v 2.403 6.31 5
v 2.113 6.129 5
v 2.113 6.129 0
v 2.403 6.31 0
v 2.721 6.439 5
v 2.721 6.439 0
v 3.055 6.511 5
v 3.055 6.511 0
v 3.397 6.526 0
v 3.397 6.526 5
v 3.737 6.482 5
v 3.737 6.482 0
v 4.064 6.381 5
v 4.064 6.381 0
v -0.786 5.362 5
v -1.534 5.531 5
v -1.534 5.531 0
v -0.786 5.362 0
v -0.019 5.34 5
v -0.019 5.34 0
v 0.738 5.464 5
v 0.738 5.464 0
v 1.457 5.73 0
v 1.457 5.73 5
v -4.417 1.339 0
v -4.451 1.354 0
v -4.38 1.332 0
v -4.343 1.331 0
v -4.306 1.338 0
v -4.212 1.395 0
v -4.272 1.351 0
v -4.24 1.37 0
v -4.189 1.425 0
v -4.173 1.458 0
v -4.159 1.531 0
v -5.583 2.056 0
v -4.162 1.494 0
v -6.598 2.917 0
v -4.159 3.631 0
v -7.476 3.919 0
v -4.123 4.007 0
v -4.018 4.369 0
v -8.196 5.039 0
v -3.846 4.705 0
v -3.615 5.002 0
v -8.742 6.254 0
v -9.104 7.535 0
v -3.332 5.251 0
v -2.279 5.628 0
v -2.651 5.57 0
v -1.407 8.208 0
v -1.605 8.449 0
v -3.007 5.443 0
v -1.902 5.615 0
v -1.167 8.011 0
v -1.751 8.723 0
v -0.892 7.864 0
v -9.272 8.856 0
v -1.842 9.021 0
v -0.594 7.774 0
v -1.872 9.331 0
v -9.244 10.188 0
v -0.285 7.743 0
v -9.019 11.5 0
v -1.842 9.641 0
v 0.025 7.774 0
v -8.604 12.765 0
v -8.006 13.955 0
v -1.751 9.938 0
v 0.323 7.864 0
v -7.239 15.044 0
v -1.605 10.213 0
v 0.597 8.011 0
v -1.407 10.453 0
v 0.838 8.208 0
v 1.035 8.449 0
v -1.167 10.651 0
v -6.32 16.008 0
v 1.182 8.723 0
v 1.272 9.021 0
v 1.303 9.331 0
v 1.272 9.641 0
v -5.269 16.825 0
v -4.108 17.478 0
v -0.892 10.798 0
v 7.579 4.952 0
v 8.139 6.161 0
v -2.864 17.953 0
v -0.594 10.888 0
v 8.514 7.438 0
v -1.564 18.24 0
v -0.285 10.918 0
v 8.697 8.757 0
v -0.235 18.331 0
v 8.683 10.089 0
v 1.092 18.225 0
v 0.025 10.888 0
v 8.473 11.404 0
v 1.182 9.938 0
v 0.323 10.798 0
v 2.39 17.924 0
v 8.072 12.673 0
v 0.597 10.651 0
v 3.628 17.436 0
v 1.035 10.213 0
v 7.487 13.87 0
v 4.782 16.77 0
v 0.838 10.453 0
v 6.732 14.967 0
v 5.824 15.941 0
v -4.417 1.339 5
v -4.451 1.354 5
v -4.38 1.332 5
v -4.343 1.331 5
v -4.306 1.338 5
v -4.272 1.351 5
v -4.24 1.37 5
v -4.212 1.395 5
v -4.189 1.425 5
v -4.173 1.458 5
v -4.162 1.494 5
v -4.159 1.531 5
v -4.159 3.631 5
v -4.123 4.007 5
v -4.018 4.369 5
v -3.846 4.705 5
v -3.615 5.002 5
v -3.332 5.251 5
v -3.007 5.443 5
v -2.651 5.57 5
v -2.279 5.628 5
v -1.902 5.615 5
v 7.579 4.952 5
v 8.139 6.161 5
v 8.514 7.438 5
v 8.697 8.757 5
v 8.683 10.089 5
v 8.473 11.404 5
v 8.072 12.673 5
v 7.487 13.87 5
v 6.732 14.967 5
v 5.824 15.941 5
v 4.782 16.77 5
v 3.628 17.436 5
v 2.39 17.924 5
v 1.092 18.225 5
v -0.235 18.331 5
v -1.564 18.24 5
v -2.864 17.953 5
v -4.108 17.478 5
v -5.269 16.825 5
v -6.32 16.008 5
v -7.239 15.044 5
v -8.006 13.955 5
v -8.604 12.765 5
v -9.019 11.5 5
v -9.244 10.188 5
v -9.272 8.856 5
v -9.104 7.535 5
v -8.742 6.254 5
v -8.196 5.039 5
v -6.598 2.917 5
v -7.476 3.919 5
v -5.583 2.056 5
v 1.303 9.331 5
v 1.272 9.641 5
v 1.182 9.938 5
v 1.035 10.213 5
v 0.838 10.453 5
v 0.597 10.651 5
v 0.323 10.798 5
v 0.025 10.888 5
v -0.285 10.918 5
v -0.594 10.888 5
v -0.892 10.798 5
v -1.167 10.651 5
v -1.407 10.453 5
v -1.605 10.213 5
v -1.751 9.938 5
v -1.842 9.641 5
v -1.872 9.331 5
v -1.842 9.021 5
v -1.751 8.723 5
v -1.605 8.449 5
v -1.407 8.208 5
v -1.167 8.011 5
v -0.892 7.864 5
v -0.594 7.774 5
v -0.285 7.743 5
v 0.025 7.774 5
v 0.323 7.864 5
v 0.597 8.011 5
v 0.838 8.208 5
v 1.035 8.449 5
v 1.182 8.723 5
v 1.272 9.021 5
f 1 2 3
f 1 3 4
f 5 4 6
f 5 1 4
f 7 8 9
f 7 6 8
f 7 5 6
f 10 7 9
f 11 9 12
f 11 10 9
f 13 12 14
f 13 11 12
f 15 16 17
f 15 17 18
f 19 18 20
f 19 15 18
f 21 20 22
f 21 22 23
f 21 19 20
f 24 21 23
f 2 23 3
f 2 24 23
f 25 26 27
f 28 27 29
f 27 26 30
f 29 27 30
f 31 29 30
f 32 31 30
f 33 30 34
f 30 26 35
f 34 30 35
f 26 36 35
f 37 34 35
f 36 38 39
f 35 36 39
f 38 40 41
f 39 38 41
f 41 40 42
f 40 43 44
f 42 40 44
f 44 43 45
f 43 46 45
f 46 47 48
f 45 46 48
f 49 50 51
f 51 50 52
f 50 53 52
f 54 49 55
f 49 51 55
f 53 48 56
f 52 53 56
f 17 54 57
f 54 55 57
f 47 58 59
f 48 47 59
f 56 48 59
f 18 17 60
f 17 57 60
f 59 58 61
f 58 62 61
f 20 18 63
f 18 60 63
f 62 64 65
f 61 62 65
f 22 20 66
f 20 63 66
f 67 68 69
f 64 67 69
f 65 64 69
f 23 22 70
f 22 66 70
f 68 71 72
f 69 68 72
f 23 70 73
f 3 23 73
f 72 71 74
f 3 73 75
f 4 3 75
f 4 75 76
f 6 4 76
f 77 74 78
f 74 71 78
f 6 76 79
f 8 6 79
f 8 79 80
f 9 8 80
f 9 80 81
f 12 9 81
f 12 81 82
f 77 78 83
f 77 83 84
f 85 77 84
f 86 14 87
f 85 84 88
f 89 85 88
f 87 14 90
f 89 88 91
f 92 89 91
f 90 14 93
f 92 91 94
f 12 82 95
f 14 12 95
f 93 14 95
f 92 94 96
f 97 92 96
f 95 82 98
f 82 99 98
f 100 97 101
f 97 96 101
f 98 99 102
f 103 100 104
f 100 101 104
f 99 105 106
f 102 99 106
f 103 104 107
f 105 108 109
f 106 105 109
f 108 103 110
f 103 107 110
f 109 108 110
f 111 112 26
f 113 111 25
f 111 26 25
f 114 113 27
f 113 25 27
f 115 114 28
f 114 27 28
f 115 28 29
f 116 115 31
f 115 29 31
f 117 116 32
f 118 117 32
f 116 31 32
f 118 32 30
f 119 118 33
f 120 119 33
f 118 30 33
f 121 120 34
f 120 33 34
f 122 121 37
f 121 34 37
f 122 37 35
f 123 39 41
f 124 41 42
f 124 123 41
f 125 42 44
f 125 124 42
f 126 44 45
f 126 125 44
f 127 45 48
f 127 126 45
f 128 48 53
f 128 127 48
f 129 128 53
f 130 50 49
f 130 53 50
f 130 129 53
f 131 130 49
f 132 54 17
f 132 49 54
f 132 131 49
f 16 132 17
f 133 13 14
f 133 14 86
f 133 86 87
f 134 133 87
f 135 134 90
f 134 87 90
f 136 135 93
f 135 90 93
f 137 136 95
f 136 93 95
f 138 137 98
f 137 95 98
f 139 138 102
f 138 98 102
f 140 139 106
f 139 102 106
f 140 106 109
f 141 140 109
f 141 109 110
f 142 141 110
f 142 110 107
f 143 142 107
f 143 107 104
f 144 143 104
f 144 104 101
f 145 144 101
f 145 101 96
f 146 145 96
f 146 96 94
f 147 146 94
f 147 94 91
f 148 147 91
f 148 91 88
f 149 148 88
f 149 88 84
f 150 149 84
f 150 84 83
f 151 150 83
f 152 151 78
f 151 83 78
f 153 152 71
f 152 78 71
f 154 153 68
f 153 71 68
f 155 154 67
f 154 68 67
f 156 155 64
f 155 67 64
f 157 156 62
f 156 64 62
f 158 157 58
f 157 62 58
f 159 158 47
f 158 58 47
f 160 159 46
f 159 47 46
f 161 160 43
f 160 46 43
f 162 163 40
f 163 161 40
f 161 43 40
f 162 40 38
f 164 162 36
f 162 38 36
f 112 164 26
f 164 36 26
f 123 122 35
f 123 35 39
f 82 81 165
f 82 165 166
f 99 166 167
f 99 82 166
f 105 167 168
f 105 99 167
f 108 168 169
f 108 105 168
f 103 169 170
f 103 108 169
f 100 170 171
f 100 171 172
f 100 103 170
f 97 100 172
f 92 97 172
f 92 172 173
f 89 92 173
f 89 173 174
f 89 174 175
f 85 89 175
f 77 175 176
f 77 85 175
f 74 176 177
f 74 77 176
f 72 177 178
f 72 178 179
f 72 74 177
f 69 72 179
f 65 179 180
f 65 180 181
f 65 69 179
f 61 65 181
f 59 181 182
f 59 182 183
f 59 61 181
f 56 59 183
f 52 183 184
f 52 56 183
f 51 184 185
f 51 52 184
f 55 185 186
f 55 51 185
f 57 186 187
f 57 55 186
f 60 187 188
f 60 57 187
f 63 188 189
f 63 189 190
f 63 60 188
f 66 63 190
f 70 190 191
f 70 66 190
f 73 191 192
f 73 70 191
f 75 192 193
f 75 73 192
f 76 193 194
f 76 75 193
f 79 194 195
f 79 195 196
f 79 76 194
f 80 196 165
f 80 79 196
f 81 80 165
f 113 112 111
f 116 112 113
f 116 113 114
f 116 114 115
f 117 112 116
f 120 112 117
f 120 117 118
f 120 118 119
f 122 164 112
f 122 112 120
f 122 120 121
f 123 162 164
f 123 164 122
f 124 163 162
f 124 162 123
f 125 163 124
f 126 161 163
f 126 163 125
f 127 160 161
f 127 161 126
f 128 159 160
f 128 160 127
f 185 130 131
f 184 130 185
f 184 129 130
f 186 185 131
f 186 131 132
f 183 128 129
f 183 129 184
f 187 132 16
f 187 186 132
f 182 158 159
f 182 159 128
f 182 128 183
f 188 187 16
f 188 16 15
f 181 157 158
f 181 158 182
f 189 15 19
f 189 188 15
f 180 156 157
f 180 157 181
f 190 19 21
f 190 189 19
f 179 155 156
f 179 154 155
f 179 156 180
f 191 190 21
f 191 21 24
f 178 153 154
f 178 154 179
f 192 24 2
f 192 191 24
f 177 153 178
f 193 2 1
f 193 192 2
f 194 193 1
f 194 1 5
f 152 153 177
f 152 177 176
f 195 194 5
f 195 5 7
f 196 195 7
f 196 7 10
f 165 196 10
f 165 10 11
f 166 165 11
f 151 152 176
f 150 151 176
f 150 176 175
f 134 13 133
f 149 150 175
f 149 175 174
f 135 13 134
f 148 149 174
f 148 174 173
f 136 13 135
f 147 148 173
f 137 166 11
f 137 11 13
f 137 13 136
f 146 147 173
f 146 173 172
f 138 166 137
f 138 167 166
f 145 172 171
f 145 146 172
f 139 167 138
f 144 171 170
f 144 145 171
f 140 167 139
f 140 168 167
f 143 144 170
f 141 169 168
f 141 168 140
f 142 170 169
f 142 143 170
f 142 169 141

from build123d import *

# Parameters (mm, degrees)
SKETCH2_R           = 9
SKETCH2_R_2         = 1.5875
BOSS_EXTRUDE2_DEPTH = 5
CUT_EXTRUDE1_DEPTH  = 6
FILLET1_R           = 0.2


with BuildPart() as part:
    # Sketch2 → Boss-Extrude2 (new body)
    with BuildSketch(Plane.XY):
        with Locations((-0.284627084, 9.330933041)):
            Circle(SKETCH2_R)
        with Locations((-0.284627084, 9.330933041)):
            Circle(SKETCH2_R_2, mode=Mode.SUBTRACT)
    extrude(amount=BOSS_EXTRUDE2_DEPTH)

    # Sketch3 → Cut-Extrude1 (cut, through all)
    with BuildSketch(Plane.XY.offset(5)):
        with BuildLine():
            Line((-4.158820782, 1.20747176), (-4.158820782, 3.631161293))
            ThreePointArc((-4.158820782, 3.631161293), (-3.331539319, 5.251263522), (-1.534089549, 5.531085209))
            ThreePointArc((-1.534089549, 5.531085209), (0.362418992, 5.383613523), (2.112594321, 6.128850978))
            ThreePointArc((2.112594321, 6.128850978), (3.05528193, 6.511368207), (4.064188319, 6.380649971))
            Line((4.064188319, 6.380649971), (7.578508136, 4.952451053))
            ThreePointArc((7.578508136, 4.952451053), (2.451086916, 0.756793497), (-4.158820782, 1.20747176))
        make_face()
    extrude(amount=-CUT_EXTRUDE1_DEPTH, mode=Mode.SUBTRACT)

    # Fillet1
    fillet1_edges = [part.edges().sort_by_distance(p)[0] for p in [
        (-4.158820782, 1.20747176, 2.5),
    ]]
    fillet(fillet1_edges, radius=FILLET1_R)


solid = part.part
